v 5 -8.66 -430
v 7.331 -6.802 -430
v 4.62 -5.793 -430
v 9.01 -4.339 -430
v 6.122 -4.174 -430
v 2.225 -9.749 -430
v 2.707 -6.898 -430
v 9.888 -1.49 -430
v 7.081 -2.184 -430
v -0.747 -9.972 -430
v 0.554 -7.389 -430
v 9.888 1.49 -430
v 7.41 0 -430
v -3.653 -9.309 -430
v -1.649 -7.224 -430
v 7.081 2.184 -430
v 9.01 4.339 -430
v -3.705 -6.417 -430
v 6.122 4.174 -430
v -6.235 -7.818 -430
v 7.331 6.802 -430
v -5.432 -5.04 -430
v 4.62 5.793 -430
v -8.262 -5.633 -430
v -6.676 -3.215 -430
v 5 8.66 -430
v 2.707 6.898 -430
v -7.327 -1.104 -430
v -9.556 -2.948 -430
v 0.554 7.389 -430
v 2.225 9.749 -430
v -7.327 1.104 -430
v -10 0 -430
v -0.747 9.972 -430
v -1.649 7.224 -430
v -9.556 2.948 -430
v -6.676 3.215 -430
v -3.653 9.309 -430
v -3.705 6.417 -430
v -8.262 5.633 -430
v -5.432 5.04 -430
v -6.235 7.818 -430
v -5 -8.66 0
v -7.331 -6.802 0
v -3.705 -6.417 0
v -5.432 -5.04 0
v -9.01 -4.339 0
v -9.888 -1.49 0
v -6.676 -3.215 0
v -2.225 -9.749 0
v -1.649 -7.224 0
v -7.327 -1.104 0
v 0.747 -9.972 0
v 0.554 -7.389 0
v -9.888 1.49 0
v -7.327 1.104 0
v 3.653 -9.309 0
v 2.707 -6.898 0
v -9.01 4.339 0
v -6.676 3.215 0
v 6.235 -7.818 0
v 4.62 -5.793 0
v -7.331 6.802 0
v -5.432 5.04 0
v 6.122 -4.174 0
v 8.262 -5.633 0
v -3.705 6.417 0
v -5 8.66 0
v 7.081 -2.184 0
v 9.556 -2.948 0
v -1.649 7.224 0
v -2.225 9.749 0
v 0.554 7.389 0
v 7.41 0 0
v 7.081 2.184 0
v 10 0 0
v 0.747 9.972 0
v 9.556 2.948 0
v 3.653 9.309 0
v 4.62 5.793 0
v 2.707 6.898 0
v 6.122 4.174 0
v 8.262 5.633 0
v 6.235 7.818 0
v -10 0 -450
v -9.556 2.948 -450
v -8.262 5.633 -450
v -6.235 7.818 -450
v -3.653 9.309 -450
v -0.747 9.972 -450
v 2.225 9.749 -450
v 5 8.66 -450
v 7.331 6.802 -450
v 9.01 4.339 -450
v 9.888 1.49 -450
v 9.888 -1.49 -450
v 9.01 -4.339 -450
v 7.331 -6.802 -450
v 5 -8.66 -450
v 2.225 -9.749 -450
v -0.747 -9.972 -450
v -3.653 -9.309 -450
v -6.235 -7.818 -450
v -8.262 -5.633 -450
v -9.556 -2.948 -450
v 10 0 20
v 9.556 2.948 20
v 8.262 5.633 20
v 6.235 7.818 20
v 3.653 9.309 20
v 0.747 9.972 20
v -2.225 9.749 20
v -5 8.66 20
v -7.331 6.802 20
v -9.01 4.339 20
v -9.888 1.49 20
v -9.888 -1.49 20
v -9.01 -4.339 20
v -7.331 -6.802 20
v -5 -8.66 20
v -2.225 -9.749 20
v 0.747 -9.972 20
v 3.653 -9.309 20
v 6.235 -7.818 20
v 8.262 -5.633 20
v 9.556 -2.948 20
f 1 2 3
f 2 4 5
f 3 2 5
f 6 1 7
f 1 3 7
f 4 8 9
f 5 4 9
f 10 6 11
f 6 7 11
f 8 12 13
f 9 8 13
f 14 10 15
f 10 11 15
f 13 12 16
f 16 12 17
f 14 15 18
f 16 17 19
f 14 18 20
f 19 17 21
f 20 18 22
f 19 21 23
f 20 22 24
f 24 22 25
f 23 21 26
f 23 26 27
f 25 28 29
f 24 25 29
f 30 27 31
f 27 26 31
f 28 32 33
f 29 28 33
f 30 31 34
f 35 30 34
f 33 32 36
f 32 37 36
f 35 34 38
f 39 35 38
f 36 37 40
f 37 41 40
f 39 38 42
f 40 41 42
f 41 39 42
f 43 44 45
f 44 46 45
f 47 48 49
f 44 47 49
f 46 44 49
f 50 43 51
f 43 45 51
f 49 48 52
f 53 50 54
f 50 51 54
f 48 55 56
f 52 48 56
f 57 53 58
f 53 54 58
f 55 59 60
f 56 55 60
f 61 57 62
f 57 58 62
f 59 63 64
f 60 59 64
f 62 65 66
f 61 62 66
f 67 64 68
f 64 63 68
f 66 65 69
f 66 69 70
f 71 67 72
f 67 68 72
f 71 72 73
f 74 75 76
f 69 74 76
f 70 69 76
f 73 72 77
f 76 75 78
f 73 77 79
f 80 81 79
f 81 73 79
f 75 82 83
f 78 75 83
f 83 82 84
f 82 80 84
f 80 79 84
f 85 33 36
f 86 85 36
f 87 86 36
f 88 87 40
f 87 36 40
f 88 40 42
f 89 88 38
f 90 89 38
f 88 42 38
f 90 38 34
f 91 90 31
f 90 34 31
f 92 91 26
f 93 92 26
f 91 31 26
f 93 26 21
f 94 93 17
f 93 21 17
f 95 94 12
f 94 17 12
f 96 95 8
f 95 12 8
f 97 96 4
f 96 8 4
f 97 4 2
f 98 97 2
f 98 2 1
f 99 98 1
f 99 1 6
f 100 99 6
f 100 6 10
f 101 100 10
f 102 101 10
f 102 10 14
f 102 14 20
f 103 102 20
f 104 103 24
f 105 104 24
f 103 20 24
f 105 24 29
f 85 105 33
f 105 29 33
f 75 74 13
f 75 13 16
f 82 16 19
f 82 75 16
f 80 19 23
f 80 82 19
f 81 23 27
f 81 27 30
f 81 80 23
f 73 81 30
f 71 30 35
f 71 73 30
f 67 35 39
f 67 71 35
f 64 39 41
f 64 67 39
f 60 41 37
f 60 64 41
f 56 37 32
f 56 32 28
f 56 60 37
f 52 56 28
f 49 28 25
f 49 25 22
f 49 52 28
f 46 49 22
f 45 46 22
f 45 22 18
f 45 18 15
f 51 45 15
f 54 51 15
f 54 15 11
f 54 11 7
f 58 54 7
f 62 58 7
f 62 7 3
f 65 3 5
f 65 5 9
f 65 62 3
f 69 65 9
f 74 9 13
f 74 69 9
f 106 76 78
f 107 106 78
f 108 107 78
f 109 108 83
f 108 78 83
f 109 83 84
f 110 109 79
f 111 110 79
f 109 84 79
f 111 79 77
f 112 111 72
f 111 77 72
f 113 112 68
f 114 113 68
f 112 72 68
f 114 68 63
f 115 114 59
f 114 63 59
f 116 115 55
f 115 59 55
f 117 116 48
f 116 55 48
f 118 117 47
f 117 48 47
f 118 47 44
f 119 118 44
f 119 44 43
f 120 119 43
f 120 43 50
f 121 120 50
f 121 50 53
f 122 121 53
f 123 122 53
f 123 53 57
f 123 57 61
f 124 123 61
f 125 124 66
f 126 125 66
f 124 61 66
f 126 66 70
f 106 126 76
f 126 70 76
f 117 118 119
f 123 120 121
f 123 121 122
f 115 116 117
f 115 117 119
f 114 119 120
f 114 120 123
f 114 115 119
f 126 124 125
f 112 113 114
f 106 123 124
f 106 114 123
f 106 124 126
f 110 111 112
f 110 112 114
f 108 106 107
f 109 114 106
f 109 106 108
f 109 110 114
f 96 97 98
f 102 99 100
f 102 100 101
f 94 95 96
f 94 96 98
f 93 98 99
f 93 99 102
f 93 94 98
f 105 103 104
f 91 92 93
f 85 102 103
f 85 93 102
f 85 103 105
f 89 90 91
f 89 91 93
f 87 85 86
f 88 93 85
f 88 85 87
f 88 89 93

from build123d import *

# Parameters (mm, degrees)
SKETCH1_R           = 7.41
BOSS_EXTRUDE1_DEPTH = 430
SKETCH2_R           = 10
BOSS_EXTRUDE2_DEPTH = 20
SKETCH3_R           = 10
BOSS_EXTRUDE3_DEPTH = 20


with BuildPart() as part:
    # Sketch1 → Boss-Extrude1 (new body)
    with BuildSketch(Plane.XY):
        Circle(SKETCH1_R)
    extrude(amount=-BOSS_EXTRUDE1_DEPTH)

    # Sketch2 → Boss-Extrude2 (add)
    with BuildSketch(Plane(origin=(0, 0, -430), x_dir=(-1, 0, 0), z_dir=(0, 0, -1))):
        Circle(SKETCH2_R)
    extrude(amount=BOSS_EXTRUDE2_DEPTH)

    # Sketch3 → Boss-Extrude3 (add)
    with BuildSketch(Plane.XY):
        Circle(SKETCH3_R)
    extrude(amount=BOSS_EXTRUDE3_DEPTH)


solid = part.part
